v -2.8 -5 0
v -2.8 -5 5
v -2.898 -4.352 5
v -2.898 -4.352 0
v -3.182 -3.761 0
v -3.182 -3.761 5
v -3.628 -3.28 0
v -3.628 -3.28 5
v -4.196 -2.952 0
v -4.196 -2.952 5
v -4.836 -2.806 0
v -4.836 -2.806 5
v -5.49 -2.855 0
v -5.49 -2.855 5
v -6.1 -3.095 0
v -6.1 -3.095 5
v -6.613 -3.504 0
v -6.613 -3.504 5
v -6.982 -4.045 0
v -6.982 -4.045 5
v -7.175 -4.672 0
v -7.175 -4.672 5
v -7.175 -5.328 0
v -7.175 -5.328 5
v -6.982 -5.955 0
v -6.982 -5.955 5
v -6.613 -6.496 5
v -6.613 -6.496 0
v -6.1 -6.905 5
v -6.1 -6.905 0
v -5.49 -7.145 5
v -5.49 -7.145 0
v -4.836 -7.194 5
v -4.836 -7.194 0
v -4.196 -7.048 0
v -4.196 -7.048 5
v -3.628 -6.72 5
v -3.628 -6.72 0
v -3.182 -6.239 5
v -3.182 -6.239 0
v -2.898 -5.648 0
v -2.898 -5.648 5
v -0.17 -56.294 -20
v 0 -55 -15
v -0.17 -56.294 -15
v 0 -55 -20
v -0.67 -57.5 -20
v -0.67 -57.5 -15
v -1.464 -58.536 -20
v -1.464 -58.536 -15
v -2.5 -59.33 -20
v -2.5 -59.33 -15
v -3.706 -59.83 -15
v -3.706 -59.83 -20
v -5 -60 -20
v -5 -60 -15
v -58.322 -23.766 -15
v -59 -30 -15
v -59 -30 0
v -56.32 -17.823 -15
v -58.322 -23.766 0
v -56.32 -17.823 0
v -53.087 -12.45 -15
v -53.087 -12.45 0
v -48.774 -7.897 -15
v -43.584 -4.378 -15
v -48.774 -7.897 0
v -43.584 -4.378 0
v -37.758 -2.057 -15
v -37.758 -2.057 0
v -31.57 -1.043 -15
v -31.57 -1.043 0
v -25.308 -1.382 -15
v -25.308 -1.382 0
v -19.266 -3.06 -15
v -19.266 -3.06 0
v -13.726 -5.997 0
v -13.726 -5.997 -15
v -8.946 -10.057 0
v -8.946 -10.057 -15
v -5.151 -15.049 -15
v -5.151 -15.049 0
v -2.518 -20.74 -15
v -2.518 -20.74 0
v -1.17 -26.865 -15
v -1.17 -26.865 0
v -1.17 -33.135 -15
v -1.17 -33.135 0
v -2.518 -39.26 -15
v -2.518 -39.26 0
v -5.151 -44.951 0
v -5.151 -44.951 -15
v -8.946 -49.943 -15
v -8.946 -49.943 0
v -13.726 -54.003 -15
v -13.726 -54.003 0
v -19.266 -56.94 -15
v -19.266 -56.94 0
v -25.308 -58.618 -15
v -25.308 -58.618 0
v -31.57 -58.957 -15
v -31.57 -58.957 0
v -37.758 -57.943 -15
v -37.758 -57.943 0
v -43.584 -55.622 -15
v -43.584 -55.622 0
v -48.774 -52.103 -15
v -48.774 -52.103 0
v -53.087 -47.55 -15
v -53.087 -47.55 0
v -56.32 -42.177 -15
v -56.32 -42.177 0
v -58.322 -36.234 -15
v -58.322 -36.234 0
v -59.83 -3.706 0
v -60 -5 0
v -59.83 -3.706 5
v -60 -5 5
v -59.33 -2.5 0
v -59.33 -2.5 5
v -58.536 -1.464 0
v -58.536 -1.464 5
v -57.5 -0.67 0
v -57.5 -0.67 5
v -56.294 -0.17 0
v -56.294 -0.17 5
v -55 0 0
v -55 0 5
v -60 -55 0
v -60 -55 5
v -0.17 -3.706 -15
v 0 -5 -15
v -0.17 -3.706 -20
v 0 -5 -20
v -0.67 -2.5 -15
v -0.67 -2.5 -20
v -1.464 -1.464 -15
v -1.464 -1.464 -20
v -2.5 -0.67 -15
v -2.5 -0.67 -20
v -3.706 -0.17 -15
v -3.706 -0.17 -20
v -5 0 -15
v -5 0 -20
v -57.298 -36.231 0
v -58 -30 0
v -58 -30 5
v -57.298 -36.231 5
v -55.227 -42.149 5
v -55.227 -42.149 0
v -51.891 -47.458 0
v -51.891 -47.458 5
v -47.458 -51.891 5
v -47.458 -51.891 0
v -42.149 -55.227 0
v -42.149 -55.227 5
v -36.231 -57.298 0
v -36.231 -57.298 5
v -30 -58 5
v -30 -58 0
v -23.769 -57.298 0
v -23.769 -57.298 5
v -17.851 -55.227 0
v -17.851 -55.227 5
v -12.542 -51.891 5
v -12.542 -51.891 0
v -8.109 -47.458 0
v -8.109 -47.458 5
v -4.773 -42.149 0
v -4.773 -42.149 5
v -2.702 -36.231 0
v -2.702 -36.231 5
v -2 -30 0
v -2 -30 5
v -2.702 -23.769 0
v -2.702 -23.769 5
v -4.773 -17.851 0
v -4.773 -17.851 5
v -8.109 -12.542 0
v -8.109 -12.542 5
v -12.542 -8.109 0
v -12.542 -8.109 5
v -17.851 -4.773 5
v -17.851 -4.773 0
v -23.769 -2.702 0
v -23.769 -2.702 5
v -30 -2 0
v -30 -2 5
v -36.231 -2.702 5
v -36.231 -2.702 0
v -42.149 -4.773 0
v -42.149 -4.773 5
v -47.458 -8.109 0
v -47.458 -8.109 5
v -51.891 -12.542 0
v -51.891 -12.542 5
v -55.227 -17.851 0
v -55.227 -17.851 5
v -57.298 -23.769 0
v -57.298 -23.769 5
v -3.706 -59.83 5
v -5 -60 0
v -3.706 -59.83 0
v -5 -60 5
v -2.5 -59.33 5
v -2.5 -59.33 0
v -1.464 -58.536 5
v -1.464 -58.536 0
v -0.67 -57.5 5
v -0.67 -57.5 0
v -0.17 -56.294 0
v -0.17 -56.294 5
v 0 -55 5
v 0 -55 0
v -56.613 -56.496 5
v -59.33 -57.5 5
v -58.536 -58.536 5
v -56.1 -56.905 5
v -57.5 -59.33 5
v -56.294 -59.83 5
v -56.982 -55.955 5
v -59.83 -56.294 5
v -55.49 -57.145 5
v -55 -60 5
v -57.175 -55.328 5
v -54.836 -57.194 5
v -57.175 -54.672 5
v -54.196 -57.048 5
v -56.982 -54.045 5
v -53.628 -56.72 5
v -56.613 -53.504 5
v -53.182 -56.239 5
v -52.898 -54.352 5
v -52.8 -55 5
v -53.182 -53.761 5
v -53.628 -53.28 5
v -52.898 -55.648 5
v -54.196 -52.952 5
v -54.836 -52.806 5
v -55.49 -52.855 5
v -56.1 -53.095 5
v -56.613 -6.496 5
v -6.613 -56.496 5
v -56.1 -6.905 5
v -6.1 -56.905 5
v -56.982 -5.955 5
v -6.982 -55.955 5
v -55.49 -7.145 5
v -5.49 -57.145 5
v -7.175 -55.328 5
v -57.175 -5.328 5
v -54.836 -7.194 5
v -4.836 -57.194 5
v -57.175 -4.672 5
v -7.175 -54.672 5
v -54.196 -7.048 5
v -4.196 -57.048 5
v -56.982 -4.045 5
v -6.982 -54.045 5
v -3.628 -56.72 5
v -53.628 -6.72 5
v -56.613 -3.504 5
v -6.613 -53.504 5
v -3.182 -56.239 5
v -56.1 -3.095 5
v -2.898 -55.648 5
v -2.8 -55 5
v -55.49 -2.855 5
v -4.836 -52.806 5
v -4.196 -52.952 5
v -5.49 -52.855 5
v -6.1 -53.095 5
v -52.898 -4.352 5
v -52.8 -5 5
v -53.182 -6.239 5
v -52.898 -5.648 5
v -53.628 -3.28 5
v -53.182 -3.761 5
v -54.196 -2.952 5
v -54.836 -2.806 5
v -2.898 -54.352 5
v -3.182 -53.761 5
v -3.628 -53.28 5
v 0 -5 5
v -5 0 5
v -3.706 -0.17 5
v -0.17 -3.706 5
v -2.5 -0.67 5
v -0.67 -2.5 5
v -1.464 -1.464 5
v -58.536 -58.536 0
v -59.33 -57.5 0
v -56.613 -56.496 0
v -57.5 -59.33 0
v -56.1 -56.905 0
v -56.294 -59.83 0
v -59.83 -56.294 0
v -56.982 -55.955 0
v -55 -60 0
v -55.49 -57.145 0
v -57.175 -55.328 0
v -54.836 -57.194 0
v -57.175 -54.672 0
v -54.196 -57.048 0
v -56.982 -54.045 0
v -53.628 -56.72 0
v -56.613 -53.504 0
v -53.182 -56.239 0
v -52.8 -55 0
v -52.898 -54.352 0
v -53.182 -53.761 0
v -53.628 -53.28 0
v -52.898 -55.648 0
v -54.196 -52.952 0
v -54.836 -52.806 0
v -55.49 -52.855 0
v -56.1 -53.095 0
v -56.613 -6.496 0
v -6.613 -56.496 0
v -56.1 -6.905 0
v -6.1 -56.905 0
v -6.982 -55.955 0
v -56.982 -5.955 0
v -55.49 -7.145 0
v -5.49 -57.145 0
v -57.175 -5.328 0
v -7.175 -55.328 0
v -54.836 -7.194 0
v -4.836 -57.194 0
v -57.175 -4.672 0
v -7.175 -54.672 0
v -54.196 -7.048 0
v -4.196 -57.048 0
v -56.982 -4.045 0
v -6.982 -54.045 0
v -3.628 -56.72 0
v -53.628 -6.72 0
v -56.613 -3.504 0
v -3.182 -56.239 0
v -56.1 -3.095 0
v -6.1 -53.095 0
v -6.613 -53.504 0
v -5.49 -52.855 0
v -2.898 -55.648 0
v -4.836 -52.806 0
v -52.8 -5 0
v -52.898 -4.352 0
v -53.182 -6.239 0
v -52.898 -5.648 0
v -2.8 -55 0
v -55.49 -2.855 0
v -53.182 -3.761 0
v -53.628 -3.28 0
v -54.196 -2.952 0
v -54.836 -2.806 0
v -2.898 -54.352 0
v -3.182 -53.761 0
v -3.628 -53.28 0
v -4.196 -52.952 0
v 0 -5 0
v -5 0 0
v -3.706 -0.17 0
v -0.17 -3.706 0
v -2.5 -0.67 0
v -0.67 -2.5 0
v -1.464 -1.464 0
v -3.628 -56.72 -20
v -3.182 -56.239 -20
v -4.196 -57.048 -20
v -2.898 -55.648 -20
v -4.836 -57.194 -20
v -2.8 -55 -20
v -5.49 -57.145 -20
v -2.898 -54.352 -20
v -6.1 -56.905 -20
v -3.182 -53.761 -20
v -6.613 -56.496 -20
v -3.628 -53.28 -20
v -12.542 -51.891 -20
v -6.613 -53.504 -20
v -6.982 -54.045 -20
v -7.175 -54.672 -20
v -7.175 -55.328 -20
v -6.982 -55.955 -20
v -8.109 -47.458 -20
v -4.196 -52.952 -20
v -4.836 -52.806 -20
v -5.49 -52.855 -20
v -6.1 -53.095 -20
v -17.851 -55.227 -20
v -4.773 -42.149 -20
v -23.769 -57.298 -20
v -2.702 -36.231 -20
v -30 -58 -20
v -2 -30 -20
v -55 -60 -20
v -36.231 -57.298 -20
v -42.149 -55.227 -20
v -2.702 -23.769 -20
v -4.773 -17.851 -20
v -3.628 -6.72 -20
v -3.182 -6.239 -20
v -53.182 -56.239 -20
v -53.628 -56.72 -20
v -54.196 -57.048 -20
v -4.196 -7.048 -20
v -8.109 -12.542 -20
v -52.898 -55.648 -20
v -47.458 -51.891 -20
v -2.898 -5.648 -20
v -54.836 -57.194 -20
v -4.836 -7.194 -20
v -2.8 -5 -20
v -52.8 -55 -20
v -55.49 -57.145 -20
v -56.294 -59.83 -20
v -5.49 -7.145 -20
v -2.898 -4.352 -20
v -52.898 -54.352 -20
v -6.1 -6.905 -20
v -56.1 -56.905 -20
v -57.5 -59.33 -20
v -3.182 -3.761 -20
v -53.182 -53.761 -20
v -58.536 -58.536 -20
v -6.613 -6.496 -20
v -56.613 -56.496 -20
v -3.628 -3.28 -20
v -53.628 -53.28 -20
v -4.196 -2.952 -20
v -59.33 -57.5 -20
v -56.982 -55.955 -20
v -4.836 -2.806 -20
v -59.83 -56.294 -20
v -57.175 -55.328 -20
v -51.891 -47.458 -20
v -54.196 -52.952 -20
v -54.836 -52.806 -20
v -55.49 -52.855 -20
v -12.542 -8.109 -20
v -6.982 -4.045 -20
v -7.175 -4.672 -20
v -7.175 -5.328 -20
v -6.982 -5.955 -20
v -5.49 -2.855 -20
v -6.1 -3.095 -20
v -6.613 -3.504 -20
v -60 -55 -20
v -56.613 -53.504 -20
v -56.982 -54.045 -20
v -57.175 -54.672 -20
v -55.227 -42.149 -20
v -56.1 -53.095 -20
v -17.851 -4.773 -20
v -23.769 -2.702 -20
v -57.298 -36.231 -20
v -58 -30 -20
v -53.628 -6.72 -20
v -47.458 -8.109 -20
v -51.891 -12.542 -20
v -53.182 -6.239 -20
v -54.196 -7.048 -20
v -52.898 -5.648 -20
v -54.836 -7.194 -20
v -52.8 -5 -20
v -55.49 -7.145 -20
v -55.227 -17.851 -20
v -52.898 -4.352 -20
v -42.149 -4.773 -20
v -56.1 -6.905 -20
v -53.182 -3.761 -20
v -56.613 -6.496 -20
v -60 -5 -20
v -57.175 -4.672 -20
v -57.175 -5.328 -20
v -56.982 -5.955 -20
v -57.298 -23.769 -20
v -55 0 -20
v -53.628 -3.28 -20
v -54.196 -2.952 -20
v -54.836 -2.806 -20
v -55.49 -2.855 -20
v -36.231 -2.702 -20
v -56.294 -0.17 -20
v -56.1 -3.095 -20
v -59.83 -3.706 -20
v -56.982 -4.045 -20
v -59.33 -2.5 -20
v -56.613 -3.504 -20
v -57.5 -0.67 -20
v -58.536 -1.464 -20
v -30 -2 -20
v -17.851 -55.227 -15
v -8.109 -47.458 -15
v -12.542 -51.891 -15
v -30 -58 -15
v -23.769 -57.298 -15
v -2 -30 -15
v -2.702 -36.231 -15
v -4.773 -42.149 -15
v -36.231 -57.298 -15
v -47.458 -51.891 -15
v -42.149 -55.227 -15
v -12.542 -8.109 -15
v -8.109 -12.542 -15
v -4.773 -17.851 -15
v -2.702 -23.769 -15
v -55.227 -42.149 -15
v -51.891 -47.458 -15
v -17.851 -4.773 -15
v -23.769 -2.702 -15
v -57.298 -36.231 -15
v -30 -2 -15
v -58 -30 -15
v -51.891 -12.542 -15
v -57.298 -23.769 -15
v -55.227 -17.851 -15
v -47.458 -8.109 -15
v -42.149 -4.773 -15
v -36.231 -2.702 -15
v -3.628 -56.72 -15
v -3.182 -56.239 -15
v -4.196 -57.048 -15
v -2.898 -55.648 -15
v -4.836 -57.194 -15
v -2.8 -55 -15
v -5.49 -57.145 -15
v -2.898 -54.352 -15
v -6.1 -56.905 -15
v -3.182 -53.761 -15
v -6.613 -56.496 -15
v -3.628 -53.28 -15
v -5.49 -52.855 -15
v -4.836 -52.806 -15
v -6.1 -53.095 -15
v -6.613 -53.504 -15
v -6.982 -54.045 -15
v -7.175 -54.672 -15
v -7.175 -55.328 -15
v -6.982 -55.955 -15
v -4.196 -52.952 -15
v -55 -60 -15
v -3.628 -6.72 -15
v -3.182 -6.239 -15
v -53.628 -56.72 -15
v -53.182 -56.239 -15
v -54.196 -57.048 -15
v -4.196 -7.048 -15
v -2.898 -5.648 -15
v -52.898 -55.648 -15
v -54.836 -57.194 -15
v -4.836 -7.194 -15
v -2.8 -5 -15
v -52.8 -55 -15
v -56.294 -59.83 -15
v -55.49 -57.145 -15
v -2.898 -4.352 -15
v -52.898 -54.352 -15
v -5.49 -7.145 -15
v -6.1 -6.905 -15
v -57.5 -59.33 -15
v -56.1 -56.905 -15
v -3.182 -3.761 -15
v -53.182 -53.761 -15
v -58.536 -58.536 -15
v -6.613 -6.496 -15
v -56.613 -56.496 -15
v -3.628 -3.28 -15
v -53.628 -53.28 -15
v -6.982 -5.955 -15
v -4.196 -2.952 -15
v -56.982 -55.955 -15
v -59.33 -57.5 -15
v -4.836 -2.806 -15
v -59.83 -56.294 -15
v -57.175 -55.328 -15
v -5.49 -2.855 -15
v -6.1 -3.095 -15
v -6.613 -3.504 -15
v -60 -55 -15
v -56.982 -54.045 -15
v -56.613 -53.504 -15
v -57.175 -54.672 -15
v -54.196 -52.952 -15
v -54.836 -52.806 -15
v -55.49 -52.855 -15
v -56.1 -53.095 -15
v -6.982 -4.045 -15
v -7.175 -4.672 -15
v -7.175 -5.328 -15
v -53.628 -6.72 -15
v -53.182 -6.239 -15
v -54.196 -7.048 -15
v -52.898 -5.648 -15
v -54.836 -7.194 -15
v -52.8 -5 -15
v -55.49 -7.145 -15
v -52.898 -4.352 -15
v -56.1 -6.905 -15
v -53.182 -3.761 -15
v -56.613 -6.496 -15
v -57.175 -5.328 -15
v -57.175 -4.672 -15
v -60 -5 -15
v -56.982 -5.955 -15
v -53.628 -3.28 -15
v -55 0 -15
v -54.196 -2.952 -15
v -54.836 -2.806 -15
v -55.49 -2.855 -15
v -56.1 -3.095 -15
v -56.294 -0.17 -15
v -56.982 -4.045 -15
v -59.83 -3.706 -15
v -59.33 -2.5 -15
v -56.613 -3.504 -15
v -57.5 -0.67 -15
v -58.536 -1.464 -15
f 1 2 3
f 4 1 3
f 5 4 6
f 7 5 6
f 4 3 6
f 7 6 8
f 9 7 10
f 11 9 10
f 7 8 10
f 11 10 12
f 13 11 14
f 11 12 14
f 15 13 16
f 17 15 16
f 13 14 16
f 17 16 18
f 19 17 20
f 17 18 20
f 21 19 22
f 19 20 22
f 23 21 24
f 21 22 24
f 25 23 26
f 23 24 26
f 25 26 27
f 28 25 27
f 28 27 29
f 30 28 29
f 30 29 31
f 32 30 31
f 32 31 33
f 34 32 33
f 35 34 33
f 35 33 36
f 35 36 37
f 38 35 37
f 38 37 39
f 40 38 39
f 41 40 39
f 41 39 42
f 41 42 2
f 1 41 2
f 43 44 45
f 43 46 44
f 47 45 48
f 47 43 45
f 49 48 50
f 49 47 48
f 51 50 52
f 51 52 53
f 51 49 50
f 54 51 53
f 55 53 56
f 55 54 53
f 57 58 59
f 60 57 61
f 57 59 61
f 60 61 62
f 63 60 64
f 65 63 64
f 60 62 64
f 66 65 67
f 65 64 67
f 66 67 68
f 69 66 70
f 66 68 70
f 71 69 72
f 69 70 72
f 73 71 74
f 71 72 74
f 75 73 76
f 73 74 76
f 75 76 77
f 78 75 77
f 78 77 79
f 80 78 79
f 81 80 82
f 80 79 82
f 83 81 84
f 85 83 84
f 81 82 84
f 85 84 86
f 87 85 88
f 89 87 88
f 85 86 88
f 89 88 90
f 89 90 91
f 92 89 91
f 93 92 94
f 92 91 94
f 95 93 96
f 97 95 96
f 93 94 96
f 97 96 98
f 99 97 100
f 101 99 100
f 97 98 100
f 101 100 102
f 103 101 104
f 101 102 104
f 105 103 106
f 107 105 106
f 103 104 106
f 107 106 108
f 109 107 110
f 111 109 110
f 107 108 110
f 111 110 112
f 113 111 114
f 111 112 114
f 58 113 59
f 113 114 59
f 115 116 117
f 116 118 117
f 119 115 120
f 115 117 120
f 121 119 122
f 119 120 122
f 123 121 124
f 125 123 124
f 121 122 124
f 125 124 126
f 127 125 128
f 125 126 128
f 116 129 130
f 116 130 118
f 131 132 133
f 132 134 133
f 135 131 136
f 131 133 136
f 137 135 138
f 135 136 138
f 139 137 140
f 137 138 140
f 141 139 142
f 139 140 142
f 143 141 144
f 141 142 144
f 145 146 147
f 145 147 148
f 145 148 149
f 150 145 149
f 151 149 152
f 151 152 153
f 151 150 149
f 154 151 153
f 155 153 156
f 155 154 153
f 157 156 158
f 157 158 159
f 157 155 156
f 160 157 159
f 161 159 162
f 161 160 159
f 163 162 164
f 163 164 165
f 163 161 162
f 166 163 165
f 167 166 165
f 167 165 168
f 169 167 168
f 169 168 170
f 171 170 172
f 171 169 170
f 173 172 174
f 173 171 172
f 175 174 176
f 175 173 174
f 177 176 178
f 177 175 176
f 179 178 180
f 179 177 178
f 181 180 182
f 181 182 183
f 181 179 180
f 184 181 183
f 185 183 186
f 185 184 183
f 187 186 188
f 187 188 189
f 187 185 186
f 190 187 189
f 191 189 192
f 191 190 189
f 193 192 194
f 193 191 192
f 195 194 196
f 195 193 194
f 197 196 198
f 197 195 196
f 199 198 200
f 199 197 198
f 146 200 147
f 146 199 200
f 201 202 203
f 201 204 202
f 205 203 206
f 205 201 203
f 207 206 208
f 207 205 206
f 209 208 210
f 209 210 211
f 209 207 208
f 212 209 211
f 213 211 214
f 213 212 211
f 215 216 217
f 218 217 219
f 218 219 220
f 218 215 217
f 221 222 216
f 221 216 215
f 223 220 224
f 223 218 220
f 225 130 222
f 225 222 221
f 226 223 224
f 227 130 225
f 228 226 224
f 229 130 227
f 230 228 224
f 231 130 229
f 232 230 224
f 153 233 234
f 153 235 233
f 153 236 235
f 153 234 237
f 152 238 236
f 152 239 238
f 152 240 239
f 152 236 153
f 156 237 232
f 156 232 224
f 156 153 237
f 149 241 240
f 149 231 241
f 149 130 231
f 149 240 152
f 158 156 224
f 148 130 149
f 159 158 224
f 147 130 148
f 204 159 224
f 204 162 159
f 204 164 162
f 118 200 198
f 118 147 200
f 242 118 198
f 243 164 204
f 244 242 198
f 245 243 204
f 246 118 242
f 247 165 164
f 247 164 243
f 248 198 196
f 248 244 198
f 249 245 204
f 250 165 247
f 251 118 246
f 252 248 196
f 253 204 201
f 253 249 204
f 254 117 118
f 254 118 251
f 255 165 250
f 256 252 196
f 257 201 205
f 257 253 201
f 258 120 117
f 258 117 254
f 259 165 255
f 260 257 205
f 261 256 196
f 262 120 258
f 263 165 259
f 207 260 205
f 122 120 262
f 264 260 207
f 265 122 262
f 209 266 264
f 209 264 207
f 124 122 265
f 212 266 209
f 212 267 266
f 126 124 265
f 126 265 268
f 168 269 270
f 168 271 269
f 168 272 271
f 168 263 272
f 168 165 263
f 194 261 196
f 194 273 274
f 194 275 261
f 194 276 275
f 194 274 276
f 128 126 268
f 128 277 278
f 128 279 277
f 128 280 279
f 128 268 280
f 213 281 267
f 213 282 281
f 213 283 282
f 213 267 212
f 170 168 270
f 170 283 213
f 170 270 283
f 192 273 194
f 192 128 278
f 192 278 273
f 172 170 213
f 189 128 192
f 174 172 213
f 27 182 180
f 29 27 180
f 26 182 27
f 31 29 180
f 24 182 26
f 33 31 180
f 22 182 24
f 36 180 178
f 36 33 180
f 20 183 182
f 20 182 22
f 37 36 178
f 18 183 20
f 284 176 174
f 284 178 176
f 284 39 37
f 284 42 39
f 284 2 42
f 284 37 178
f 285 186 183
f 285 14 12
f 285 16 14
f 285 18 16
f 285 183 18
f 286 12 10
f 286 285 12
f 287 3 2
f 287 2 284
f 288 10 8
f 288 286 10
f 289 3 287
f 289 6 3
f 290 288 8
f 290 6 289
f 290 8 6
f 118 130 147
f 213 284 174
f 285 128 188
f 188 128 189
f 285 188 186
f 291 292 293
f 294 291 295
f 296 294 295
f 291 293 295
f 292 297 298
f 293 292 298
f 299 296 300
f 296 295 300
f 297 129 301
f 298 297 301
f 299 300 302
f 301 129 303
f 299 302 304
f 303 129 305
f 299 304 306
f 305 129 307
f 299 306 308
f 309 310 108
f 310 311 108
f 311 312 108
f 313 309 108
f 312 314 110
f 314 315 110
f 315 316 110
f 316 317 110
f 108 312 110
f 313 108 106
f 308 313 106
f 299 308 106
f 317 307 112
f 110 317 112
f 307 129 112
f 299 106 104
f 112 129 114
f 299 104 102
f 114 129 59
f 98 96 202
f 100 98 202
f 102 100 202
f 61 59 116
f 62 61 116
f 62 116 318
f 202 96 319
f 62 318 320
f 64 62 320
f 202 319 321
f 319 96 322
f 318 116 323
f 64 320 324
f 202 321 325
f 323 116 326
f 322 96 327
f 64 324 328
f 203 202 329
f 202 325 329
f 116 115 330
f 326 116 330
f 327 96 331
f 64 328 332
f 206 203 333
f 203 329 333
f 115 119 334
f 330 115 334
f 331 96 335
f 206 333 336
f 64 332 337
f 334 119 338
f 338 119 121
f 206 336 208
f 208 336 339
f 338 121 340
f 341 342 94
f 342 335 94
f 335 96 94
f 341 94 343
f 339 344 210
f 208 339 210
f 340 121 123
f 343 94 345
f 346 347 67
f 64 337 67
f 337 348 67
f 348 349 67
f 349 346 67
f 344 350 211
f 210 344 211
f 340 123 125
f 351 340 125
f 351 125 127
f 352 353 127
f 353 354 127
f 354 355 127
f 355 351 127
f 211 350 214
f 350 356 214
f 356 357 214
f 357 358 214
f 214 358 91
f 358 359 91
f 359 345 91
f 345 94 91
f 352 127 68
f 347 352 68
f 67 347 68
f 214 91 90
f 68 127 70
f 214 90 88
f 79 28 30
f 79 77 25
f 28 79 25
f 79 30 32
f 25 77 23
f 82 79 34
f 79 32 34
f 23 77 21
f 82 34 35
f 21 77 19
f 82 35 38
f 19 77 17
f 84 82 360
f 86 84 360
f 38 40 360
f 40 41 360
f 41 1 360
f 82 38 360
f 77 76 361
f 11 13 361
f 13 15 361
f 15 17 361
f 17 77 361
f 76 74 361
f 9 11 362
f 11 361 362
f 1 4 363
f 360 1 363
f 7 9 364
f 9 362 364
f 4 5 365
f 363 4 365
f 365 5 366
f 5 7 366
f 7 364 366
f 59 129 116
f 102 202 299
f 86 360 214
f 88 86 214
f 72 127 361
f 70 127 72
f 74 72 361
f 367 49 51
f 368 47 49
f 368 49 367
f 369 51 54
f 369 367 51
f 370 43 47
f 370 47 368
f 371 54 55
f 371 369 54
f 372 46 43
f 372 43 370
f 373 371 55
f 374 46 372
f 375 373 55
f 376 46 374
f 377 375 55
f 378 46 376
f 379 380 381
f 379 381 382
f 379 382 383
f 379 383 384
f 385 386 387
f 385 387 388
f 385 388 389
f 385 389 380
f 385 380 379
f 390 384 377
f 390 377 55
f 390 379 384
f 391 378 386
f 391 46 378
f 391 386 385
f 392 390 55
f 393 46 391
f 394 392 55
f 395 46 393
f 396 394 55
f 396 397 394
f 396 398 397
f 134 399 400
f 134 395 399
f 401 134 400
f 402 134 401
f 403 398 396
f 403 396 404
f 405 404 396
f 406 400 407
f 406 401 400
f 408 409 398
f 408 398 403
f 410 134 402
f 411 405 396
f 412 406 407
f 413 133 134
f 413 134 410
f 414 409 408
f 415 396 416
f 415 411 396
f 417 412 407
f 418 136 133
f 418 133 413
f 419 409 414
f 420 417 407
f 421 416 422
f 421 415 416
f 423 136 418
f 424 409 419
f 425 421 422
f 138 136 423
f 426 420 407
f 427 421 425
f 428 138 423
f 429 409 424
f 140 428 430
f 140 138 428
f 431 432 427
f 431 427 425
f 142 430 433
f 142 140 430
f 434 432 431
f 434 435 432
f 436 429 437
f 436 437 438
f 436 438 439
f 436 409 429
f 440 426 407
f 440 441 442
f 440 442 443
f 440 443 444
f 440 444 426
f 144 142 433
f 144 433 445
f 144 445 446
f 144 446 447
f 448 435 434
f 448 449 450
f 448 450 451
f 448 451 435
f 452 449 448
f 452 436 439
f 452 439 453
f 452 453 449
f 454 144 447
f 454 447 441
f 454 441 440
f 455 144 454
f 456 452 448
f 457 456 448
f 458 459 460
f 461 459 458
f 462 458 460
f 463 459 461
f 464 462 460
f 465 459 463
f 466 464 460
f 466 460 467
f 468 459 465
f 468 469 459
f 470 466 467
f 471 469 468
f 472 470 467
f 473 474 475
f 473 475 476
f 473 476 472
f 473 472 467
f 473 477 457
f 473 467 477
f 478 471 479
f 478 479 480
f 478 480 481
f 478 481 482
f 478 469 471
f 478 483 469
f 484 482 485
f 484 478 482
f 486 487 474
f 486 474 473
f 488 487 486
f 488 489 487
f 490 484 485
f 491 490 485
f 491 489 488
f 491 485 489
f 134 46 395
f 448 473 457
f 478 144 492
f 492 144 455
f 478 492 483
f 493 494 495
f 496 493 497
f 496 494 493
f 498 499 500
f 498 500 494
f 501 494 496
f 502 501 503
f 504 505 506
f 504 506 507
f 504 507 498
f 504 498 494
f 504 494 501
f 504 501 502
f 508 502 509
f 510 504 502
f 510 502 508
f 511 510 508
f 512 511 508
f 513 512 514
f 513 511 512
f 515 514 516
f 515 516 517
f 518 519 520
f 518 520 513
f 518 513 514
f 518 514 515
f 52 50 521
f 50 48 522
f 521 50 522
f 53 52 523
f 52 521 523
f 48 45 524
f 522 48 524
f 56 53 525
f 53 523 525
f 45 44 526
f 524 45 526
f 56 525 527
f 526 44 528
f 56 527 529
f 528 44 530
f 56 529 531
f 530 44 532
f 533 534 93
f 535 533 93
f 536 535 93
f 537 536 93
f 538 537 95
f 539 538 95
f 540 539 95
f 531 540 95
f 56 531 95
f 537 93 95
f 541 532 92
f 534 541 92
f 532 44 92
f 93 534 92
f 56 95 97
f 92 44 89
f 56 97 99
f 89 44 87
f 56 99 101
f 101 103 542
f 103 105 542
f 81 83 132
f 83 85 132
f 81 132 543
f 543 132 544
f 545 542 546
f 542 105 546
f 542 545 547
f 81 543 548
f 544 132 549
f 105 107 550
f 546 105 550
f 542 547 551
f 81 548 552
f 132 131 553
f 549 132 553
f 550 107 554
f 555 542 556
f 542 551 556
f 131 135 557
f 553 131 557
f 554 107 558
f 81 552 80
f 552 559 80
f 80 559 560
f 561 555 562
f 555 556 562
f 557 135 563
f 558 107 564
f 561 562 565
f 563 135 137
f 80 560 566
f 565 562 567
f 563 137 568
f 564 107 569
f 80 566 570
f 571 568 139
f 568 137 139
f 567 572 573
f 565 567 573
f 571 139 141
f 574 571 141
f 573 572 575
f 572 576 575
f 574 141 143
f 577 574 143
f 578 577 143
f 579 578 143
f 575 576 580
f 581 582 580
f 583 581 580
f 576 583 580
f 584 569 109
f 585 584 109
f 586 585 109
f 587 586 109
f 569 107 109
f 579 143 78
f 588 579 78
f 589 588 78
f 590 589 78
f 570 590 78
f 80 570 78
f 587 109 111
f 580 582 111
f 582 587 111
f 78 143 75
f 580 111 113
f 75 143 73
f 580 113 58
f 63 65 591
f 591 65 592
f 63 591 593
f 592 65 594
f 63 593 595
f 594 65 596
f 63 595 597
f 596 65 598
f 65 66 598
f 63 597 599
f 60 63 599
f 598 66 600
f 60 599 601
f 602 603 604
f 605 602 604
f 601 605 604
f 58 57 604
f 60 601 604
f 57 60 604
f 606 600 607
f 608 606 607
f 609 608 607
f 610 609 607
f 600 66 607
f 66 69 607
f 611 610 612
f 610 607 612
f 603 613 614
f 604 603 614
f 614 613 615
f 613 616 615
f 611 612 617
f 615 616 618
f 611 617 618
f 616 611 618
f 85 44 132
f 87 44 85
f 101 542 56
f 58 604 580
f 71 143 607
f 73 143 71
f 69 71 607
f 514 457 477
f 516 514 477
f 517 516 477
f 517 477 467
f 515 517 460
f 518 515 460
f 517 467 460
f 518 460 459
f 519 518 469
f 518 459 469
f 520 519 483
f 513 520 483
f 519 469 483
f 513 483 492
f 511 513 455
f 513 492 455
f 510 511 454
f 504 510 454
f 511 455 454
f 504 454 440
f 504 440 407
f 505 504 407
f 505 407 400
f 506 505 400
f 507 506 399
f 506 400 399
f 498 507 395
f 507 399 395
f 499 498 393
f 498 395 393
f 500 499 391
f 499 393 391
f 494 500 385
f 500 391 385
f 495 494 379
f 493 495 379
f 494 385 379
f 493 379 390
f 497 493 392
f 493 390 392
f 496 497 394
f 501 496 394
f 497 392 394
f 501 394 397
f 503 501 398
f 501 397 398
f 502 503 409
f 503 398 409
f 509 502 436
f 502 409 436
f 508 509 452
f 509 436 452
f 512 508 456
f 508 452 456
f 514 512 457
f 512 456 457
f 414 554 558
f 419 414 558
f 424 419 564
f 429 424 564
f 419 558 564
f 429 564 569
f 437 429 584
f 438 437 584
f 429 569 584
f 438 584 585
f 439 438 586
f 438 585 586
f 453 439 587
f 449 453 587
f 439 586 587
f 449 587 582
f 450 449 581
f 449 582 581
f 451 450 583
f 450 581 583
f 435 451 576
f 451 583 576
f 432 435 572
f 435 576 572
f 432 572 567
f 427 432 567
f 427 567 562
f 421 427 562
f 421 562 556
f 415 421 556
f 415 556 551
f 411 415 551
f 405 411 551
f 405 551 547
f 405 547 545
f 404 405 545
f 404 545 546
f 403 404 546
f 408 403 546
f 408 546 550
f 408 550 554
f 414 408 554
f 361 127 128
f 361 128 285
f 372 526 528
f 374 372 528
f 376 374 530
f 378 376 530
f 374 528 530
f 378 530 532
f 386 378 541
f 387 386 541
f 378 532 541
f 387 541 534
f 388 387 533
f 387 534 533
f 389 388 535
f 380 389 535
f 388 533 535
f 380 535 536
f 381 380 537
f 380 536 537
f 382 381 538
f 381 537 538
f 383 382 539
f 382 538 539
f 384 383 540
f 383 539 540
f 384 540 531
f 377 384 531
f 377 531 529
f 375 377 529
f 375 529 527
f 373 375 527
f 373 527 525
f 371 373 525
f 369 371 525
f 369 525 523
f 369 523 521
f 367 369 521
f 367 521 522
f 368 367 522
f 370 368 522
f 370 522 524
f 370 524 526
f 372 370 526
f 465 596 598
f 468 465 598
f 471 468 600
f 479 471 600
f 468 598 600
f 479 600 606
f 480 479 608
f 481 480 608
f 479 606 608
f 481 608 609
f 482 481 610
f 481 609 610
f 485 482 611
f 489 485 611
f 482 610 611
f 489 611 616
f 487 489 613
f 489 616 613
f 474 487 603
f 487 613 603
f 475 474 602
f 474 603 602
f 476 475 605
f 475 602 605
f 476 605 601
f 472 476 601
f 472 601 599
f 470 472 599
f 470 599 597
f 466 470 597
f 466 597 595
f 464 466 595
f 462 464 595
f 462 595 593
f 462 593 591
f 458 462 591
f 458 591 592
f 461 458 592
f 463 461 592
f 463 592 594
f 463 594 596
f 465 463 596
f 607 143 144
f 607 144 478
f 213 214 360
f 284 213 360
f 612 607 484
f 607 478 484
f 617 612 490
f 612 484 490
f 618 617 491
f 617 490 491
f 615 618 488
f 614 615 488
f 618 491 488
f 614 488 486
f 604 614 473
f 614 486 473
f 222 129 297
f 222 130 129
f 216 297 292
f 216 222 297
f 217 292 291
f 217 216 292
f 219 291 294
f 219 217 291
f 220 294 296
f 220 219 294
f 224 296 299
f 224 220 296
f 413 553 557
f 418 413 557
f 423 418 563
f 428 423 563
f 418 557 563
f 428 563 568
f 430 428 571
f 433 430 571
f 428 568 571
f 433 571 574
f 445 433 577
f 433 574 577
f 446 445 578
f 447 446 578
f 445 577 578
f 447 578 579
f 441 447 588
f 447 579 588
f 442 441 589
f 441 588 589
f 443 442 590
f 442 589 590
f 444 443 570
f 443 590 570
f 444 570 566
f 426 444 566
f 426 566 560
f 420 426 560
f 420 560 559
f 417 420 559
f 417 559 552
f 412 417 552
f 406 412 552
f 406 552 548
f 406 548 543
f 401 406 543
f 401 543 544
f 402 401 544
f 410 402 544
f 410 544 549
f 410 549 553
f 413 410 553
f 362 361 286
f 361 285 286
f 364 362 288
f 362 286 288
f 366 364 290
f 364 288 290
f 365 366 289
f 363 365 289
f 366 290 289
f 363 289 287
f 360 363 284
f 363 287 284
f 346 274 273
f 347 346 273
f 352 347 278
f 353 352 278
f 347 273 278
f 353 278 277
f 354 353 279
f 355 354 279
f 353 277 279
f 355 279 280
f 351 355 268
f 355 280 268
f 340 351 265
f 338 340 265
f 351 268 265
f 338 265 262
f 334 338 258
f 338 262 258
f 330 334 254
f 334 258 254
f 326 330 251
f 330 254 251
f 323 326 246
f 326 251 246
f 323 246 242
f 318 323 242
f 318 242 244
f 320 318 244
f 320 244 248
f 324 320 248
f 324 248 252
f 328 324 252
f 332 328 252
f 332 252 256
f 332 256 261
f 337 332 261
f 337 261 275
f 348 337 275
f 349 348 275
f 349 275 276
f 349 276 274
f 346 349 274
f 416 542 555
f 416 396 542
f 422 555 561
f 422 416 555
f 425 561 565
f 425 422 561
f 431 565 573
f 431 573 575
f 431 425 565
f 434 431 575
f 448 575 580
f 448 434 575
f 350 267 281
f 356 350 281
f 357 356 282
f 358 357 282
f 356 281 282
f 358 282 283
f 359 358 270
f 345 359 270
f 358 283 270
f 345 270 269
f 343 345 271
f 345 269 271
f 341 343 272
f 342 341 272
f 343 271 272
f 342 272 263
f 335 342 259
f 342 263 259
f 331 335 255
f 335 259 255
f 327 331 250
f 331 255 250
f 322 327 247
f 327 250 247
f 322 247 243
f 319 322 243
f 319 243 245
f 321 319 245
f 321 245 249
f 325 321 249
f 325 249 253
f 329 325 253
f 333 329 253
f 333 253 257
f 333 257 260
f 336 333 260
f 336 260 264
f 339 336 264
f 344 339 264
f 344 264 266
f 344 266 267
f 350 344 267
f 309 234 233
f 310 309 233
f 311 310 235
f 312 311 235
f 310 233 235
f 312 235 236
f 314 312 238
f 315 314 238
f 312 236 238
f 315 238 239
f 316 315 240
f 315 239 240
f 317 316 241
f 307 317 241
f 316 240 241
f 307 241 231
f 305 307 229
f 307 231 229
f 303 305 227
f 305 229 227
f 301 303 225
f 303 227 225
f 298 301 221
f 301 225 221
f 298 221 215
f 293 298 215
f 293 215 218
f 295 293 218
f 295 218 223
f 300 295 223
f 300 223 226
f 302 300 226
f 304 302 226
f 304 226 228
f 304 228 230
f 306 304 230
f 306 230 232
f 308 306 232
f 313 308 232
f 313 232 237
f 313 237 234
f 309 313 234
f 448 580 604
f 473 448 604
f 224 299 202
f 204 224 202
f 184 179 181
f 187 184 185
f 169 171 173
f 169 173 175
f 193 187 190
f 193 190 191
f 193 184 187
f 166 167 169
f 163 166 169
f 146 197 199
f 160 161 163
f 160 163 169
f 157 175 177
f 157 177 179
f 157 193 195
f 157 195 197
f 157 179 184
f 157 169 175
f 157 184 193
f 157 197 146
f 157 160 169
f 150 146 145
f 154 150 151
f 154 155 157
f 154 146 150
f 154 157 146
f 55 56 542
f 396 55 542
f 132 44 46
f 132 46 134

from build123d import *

# Parameters (mm, degrees)
SKETCH_1_W          = 60
SKETCH_1_H          = 60
EXTRUDE_1_DEPTH     = 5
SKETCH_3_R          = 29
EXTRUDE_2_DEPTH     = 15
SKETCH_4_W          = 60
SKETCH_4_H          = 60
EXTRUDE_3_DEPTH     = 5
FILLET_1_R          = 5
SKETCH_5_R          = 2.2
CUT_EXTRUDE_1_DEPTH = 89.459030065
SKETCH_6_R          = 28
CUT_EXTRUDE_4_DEPTH = 5
CUT_EXTRUDE_START   = -5
SKETCH_7_R          = 28
CUT_EXTRUDE_5_DEPTH = 5


with BuildPart() as part:
    # Эскиз1 → Бобышка-Вытянуть1 (new body)
    with BuildSketch(Plane.XY):
        with Locations((-30, -30)):
            Rectangle(SKETCH_1_W, SKETCH_1_H)
    extrude(amount=EXTRUDE_1_DEPTH)

    # Эскиз3 → Бобышка-Вытянуть2 (add)
    with BuildSketch(Plane(origin=(0, 0, 0), x_dir=(-1, 0, 0), z_dir=(0, 0, -1))):
        with Locations((30, -30)):
            Circle(SKETCH_3_R)
    extrude(amount=EXTRUDE_2_DEPTH)

    # Эскиз4 → Бобышка-Вытянуть3 (add)
    with BuildSketch(Plane(origin=(0, 0, -15), x_dir=(-1, 0, 0), z_dir=(0, 0, -1))):
        with Locations((30, -30)):
            Rectangle(SKETCH_4_W, SKETCH_4_H)
    extrude(amount=EXTRUDE_3_DEPTH)

    # Скругление1
    fillet_1_edges = [part.edges().sort_by_distance(p)[0] for p in [
        (-60, -60, 2.5),
        (-60, -60, -17.5),
        (0, -60, -17.5),
        (0, -60, 2.5),
        (0, 0, -17.5),
        (-60, 0, -17.5),
        (-60, 0, 2.5),
        (0, 0, 2.5),
    ]]
    fillet(fillet_1_edges, radius=FILLET_1_R)

    # Эскиз5 → Вырез-Вытянуть1 (cut, through all)
    with BuildSketch(Plane.XY.offset(5)):
        with Locations((-55, -5)):
            Circle(SKETCH_5_R)
        with Locations((-5, -5)):
            Circle(SKETCH_5_R)
        with Locations((-5, -55)):
            Circle(SKETCH_5_R)
        with Locations((-55, -55)):
            Circle(SKETCH_5_R)
    extrude(amount=-CUT_EXTRUDE_1_DEPTH, mode=Mode.SUBTRACT)

    # Эскиз6 → Вырез-Вытянуть4 (cut)
    with BuildSketch(Plane(origin=(0, 0, -20), x_dir=(-1, 0, 0), z_dir=(0, 0, -1))):
        with Locations((30, -30)):
            Circle(SKETCH_6_R)
    extrude(amount=-CUT_EXTRUDE_4_DEPTH, mode=Mode.SUBTRACT)

    # Эскиз7 → Вырез-Вытянуть5 (cut)
    with BuildSketch(Plane.XY.offset(5).offset(CUT_EXTRUDE_START)):
        with Locations((-30, -30)):
            Circle(SKETCH_7_R)
    extrude(amount=CUT_EXTRUDE_5_DEPTH, mode=Mode.SUBTRACT)


solid = part.part
